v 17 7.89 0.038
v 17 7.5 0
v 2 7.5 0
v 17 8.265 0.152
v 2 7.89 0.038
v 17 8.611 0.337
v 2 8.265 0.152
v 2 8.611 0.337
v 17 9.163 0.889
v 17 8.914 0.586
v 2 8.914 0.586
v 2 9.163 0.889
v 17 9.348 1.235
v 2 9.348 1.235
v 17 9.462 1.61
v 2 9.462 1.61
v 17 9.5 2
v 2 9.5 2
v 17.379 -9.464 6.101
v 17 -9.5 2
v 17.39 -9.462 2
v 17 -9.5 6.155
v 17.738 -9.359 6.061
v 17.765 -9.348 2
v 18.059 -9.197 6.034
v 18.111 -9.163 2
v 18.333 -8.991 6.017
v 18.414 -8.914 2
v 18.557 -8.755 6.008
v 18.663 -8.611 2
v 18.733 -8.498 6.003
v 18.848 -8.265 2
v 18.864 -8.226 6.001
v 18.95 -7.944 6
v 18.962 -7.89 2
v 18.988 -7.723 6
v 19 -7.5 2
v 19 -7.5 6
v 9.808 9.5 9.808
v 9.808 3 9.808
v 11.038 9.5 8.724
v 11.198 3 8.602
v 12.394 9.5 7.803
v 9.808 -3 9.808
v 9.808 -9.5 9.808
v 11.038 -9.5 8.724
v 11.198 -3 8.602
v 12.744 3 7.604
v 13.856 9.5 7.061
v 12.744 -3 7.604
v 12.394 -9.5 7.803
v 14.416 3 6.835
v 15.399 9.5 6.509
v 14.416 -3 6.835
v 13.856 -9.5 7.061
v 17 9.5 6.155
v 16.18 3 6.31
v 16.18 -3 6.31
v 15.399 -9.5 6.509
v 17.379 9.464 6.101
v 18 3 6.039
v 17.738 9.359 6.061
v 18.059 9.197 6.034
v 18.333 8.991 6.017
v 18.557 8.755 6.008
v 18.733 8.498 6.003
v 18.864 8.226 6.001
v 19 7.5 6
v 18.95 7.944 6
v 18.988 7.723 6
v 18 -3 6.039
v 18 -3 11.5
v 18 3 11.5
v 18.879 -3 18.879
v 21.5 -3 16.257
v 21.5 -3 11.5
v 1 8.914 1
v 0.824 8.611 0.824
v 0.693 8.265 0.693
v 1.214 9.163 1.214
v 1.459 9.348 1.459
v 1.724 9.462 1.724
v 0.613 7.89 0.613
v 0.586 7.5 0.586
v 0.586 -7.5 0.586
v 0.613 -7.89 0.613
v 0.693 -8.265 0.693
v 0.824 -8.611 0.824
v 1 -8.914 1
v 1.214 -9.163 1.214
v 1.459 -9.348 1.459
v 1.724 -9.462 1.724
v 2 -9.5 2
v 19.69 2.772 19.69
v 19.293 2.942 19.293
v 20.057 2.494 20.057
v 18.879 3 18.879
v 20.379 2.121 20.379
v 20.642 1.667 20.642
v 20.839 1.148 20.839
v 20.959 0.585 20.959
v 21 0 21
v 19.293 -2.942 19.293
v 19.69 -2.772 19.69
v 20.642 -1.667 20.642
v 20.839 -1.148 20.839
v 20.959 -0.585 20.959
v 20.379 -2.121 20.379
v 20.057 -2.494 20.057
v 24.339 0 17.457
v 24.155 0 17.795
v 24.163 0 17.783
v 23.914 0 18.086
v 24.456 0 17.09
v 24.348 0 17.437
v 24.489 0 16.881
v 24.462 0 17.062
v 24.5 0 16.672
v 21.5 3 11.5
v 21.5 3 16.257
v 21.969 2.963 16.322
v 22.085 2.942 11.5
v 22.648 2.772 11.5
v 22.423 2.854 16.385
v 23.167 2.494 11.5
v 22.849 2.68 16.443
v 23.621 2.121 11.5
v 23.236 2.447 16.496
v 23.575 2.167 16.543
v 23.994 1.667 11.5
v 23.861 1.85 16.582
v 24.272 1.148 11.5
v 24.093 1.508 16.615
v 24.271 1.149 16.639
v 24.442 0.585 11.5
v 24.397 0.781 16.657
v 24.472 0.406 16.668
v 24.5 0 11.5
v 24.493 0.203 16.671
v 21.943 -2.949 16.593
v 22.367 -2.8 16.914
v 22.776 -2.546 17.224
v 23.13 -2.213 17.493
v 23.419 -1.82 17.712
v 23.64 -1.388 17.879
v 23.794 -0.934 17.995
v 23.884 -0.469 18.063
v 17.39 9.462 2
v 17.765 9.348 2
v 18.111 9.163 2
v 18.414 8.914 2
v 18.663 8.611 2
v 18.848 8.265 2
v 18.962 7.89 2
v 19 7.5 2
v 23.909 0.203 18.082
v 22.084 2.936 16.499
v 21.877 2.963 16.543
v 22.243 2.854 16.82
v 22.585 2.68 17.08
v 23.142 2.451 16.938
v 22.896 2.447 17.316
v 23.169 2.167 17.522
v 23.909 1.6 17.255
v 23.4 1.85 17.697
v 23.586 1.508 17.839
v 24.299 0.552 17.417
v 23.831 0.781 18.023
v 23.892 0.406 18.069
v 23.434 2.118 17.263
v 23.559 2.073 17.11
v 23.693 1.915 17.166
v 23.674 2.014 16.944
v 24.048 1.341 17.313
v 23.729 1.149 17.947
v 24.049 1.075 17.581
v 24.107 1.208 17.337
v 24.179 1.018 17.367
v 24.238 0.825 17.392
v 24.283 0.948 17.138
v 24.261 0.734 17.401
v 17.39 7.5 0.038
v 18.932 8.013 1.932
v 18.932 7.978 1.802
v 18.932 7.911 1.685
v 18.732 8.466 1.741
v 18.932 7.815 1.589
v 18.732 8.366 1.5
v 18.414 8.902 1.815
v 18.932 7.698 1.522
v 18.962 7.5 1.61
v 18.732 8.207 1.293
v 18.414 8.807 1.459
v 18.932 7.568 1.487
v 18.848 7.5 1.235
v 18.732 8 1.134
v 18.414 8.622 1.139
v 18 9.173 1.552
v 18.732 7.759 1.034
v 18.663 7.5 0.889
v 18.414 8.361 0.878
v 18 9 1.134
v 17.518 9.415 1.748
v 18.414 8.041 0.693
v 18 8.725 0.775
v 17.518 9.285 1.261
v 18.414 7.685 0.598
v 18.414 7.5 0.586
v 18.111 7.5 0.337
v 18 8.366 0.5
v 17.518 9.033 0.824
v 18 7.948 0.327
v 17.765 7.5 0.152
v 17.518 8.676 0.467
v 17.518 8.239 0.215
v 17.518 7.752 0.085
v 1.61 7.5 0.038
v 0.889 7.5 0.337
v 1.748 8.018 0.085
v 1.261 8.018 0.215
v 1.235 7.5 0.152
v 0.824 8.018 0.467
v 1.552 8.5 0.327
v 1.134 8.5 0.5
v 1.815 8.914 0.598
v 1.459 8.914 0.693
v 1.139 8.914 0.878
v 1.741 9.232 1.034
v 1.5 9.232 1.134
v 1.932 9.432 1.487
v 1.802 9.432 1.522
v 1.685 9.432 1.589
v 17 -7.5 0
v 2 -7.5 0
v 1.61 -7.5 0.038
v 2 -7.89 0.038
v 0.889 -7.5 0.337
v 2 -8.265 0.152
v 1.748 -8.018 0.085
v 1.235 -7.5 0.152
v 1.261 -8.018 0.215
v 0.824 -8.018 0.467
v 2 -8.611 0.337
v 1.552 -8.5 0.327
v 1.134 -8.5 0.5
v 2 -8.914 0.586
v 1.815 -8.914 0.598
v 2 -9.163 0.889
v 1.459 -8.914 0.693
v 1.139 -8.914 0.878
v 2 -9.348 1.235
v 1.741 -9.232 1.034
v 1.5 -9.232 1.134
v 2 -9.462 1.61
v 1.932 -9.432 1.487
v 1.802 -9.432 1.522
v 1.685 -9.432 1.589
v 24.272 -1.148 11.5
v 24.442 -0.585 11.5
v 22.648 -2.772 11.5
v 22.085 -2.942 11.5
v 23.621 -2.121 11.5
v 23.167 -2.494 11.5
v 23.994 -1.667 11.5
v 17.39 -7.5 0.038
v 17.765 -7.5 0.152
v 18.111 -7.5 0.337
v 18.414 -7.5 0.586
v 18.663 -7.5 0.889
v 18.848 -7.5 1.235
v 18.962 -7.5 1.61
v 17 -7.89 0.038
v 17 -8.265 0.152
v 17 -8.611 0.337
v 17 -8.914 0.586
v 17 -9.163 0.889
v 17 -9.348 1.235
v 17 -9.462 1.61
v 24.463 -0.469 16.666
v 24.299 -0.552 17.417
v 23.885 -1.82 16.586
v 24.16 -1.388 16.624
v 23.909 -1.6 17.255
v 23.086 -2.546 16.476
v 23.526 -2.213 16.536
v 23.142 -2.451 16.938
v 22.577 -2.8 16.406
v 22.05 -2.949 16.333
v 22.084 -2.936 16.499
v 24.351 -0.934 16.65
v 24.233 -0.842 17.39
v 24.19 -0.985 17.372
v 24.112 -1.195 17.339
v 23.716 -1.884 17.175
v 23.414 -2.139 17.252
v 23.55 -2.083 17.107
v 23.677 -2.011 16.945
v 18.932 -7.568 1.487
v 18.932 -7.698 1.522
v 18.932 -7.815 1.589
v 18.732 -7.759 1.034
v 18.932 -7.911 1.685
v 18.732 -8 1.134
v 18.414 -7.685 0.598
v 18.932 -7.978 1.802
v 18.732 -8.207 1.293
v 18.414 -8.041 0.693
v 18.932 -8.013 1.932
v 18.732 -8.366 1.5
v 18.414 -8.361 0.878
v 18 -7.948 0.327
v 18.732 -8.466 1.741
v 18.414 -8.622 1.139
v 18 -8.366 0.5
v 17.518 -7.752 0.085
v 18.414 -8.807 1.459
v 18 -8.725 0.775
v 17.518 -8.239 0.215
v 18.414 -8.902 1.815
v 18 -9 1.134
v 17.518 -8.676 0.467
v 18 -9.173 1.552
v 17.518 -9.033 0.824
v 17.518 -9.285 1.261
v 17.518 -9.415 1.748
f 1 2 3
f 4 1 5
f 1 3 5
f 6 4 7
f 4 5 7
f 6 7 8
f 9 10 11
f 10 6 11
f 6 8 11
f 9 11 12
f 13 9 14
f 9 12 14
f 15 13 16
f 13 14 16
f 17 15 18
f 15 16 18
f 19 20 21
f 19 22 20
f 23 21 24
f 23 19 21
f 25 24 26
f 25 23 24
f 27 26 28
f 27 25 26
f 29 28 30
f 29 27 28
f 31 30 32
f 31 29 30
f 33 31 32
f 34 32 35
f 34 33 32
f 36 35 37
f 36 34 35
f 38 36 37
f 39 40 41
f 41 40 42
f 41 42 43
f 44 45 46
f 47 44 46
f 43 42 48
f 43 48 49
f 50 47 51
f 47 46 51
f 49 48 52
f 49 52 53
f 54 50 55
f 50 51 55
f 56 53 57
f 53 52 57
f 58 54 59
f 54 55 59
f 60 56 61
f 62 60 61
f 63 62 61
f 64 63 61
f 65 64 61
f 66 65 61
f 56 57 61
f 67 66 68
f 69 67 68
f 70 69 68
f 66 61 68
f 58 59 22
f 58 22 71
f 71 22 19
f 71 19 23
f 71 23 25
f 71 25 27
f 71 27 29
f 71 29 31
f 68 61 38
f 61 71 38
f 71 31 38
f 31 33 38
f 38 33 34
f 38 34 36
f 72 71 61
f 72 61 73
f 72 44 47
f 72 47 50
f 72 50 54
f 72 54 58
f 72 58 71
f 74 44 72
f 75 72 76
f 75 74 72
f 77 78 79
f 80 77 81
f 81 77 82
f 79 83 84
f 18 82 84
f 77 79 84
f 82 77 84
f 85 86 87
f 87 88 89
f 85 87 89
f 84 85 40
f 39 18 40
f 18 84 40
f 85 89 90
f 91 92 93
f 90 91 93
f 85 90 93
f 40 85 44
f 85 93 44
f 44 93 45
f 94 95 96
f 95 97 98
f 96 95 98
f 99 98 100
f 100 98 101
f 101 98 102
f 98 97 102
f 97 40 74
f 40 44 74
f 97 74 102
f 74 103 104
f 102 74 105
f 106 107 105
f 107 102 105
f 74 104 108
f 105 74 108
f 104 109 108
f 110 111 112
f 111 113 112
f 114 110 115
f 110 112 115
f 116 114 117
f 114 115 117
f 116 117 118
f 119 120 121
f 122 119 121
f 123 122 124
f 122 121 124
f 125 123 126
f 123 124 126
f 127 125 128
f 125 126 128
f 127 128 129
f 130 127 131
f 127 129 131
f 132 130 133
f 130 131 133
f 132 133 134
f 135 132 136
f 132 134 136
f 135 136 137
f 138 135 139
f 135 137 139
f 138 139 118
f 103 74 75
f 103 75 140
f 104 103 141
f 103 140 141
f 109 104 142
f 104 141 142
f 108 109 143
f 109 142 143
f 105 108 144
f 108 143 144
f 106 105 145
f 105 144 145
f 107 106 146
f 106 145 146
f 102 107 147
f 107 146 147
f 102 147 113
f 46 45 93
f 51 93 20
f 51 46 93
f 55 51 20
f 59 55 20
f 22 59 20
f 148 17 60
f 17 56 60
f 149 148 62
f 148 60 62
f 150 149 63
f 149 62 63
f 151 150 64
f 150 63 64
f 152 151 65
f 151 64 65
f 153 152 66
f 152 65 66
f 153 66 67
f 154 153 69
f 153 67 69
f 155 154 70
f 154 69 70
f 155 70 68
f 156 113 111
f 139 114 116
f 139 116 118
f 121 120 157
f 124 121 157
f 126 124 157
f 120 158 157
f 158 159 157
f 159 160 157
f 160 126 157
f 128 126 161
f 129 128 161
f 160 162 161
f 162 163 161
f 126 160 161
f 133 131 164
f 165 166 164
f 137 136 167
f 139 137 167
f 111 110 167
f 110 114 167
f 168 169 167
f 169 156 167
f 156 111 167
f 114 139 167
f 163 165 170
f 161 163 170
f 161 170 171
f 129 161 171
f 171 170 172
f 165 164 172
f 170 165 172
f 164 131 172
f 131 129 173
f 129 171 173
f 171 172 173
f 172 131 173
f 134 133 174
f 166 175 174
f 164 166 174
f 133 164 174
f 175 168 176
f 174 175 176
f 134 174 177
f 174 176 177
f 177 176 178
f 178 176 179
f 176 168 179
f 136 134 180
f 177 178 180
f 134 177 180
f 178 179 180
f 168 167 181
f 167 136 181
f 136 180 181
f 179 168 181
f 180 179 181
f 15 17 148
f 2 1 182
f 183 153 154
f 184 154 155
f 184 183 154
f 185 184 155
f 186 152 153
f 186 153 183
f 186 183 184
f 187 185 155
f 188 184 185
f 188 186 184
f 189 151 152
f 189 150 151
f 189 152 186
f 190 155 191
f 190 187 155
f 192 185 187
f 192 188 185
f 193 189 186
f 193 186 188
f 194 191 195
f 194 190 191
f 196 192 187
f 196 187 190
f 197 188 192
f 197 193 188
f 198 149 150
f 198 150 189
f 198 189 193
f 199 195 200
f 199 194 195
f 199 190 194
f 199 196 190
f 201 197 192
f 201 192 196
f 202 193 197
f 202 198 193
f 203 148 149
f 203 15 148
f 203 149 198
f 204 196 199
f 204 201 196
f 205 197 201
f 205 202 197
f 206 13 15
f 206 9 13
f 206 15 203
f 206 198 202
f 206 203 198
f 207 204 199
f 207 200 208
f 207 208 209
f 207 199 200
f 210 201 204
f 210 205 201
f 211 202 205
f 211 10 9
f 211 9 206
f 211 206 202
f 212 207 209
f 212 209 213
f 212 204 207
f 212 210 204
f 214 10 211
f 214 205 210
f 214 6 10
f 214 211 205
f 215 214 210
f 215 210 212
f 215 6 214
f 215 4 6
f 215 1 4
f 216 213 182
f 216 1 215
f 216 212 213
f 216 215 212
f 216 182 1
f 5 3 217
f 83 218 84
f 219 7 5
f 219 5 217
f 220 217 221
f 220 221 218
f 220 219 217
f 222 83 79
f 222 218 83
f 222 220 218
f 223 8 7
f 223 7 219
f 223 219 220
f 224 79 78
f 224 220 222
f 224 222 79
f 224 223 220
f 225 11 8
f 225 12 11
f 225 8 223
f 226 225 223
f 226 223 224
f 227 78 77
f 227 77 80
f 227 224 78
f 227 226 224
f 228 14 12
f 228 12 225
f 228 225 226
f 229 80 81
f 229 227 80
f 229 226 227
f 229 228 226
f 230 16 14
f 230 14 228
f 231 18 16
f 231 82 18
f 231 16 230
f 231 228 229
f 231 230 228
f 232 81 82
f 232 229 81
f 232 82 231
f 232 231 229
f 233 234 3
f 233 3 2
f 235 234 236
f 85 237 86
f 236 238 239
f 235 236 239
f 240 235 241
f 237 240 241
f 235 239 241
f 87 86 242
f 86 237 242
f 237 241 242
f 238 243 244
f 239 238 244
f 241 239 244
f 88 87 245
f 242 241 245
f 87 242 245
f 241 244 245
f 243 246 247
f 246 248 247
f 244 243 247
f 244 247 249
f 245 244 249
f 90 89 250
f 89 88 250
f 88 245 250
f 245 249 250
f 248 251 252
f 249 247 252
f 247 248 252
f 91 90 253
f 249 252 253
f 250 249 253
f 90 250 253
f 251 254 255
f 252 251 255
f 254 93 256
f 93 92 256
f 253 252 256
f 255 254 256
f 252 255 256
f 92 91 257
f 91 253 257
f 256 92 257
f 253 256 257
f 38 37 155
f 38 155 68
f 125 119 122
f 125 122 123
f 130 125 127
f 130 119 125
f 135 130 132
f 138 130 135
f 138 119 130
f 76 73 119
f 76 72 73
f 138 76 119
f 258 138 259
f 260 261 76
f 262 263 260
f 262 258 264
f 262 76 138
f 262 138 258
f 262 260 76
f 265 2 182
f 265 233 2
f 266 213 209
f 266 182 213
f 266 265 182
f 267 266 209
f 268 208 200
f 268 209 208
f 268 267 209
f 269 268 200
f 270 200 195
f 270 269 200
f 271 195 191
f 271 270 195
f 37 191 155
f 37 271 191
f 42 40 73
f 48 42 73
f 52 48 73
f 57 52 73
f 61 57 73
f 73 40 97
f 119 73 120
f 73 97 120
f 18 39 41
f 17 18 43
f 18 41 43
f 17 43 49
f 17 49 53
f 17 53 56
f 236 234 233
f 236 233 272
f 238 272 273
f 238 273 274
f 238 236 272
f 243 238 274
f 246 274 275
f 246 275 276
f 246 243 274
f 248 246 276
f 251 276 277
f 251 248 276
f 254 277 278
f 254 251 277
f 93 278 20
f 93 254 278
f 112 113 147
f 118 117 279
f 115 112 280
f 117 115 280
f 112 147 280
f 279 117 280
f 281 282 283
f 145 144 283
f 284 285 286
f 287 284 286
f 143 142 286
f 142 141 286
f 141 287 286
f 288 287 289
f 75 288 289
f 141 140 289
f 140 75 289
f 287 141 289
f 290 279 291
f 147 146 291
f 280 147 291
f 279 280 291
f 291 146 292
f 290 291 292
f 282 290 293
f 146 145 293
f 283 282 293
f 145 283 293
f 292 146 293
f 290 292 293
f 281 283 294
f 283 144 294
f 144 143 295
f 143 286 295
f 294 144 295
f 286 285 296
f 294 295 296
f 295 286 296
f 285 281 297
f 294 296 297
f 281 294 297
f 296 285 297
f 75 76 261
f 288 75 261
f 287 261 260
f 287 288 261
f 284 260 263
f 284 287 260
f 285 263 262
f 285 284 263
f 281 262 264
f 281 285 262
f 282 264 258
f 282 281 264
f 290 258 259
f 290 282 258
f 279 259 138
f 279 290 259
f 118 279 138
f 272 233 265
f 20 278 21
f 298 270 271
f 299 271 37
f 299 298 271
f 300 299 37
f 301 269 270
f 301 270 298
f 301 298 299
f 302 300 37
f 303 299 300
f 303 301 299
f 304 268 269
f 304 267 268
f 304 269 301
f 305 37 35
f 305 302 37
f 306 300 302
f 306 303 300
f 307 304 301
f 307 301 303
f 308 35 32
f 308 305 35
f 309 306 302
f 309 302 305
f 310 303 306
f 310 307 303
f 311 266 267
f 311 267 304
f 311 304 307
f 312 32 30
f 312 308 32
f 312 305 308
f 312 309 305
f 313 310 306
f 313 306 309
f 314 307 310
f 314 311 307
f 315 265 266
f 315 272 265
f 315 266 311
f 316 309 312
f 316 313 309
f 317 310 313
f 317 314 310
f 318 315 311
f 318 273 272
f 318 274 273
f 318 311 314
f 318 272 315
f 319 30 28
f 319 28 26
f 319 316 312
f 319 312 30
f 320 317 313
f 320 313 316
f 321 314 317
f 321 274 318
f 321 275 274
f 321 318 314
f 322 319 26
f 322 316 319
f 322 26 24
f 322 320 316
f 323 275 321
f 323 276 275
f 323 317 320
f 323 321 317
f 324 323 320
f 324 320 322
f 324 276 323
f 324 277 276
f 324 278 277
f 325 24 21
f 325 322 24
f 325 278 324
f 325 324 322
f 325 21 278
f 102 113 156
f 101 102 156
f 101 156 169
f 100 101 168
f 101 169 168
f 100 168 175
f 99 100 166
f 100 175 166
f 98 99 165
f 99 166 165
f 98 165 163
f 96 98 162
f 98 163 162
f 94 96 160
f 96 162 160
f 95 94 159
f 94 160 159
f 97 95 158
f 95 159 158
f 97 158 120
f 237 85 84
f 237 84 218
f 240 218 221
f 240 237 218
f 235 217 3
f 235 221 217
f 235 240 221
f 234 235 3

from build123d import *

# Parameters (mm, degrees)
F0_W      = 19
F0_H      = 19
F1_DEPTH  = 9.5
F3_DEPTH  = 19.001
F5_DEPTH  = 3
F6_R      = 2
F8_DEPTH  = 12.501
F9_R      = 2
F11_DEPTH = 9.5
F12_R     = 2.99999
F13_R     = 2


# Not quite as in the source:
# - a fillet or chamfer is up to 0.001 mm smaller than in the source, because OpenCascade refuses the exact size


with BuildPart() as f1:
    # F0 (on Front) → F1 (new body, symmetric)
    with BuildSketch(Plane.XZ):
        with Locations((9.5, 9.5)):
            Rectangle(F0_W, F0_H)
    extrude(amount=F1_DEPTH, both=True)

    # F2 (on face) → F3 (cut, through all)
    with BuildSketch(Plane.XZ.offset(9.5)):
        with BuildLine():
            ThreePointArc((6, 19), (9.8076118446, 9.8076118446), (19, 6))
            Line((19, 6), (19, 19))
            Line((19, 19), (6, 19))
        make_face()
    extrude(amount=-F3_DEPTH, mode=Mode.SUBTRACT)

    # F4 (on Front) → F5 (join, symmetric)
    with BuildSketch(Plane.XZ):
        Polygon((0, 18), (0, 0), (18, 0), (18, 11.5), (24.5, 11.5), (24.5, 24.5), (11.5, 24.5), (11.5, 18), align=None)
    extrude(amount=F5_DEPTH, both=True)

    # F6
    f6_edges = [f1.edges().sort_by_distance(p)[0] for p in [
        (0, 0, 0),
    ]]
    fillet(f6_edges, radius=F6_R)

    # F7 (on face) → F8 (cut, through all)
    with BuildSketch(Plane.XZ.offset(3)):
        Polygon((17.5, 24.5), (24.5, 17.5), (24.5, 24.5), align=None)
    extrude(amount=-F8_DEPTH, mode=Mode.SUBTRACT)

    # F9
    f9_edges = [f1.edges().sort_by_distance(p)[0] for p in [
        (0, -9.5, 10.5),
        (0, 9.5, 10.5),
        (0, 0, 19),
        (3, 9.5, 19),
        (3, -9.5, 19),
        (19, 9.5, 3),
        (19, 0, 0),
        (19, -9.5, 3),
    ]]
    fillet(f9_edges, radius=F9_R)

    # F10 (on Front) → F11 (cut, symmetric)
    with BuildSketch(Plane.XZ):
        Polygon((0, 25), (0, 0), (25, 25), align=None)
    extrude(amount=F11_DEPTH, both=True, mode=Mode.SUBTRACT)

    # F12 (radius 3 in the source; OpenCascade refuses exactly that, so slightly less here)
    f12_edges = [f1.edges().sort_by_distance(p)[0] for p in [
        (22.75, -3, 19.25),
        (24.5, -3, 14.5),
        (24.5, 3, 14.5),
        (22.75, 3, 19.25),
    ]]
    fillet(f12_edges, radius=F12_R)

    # F13
    f13_edges = [f1.edges().sort_by_distance(p)[0] for p in [
        (23.579023, 2.162797, 17.118519),
    ]]
    fillet(f13_edges, radius=F13_R)


solid = f1.part
